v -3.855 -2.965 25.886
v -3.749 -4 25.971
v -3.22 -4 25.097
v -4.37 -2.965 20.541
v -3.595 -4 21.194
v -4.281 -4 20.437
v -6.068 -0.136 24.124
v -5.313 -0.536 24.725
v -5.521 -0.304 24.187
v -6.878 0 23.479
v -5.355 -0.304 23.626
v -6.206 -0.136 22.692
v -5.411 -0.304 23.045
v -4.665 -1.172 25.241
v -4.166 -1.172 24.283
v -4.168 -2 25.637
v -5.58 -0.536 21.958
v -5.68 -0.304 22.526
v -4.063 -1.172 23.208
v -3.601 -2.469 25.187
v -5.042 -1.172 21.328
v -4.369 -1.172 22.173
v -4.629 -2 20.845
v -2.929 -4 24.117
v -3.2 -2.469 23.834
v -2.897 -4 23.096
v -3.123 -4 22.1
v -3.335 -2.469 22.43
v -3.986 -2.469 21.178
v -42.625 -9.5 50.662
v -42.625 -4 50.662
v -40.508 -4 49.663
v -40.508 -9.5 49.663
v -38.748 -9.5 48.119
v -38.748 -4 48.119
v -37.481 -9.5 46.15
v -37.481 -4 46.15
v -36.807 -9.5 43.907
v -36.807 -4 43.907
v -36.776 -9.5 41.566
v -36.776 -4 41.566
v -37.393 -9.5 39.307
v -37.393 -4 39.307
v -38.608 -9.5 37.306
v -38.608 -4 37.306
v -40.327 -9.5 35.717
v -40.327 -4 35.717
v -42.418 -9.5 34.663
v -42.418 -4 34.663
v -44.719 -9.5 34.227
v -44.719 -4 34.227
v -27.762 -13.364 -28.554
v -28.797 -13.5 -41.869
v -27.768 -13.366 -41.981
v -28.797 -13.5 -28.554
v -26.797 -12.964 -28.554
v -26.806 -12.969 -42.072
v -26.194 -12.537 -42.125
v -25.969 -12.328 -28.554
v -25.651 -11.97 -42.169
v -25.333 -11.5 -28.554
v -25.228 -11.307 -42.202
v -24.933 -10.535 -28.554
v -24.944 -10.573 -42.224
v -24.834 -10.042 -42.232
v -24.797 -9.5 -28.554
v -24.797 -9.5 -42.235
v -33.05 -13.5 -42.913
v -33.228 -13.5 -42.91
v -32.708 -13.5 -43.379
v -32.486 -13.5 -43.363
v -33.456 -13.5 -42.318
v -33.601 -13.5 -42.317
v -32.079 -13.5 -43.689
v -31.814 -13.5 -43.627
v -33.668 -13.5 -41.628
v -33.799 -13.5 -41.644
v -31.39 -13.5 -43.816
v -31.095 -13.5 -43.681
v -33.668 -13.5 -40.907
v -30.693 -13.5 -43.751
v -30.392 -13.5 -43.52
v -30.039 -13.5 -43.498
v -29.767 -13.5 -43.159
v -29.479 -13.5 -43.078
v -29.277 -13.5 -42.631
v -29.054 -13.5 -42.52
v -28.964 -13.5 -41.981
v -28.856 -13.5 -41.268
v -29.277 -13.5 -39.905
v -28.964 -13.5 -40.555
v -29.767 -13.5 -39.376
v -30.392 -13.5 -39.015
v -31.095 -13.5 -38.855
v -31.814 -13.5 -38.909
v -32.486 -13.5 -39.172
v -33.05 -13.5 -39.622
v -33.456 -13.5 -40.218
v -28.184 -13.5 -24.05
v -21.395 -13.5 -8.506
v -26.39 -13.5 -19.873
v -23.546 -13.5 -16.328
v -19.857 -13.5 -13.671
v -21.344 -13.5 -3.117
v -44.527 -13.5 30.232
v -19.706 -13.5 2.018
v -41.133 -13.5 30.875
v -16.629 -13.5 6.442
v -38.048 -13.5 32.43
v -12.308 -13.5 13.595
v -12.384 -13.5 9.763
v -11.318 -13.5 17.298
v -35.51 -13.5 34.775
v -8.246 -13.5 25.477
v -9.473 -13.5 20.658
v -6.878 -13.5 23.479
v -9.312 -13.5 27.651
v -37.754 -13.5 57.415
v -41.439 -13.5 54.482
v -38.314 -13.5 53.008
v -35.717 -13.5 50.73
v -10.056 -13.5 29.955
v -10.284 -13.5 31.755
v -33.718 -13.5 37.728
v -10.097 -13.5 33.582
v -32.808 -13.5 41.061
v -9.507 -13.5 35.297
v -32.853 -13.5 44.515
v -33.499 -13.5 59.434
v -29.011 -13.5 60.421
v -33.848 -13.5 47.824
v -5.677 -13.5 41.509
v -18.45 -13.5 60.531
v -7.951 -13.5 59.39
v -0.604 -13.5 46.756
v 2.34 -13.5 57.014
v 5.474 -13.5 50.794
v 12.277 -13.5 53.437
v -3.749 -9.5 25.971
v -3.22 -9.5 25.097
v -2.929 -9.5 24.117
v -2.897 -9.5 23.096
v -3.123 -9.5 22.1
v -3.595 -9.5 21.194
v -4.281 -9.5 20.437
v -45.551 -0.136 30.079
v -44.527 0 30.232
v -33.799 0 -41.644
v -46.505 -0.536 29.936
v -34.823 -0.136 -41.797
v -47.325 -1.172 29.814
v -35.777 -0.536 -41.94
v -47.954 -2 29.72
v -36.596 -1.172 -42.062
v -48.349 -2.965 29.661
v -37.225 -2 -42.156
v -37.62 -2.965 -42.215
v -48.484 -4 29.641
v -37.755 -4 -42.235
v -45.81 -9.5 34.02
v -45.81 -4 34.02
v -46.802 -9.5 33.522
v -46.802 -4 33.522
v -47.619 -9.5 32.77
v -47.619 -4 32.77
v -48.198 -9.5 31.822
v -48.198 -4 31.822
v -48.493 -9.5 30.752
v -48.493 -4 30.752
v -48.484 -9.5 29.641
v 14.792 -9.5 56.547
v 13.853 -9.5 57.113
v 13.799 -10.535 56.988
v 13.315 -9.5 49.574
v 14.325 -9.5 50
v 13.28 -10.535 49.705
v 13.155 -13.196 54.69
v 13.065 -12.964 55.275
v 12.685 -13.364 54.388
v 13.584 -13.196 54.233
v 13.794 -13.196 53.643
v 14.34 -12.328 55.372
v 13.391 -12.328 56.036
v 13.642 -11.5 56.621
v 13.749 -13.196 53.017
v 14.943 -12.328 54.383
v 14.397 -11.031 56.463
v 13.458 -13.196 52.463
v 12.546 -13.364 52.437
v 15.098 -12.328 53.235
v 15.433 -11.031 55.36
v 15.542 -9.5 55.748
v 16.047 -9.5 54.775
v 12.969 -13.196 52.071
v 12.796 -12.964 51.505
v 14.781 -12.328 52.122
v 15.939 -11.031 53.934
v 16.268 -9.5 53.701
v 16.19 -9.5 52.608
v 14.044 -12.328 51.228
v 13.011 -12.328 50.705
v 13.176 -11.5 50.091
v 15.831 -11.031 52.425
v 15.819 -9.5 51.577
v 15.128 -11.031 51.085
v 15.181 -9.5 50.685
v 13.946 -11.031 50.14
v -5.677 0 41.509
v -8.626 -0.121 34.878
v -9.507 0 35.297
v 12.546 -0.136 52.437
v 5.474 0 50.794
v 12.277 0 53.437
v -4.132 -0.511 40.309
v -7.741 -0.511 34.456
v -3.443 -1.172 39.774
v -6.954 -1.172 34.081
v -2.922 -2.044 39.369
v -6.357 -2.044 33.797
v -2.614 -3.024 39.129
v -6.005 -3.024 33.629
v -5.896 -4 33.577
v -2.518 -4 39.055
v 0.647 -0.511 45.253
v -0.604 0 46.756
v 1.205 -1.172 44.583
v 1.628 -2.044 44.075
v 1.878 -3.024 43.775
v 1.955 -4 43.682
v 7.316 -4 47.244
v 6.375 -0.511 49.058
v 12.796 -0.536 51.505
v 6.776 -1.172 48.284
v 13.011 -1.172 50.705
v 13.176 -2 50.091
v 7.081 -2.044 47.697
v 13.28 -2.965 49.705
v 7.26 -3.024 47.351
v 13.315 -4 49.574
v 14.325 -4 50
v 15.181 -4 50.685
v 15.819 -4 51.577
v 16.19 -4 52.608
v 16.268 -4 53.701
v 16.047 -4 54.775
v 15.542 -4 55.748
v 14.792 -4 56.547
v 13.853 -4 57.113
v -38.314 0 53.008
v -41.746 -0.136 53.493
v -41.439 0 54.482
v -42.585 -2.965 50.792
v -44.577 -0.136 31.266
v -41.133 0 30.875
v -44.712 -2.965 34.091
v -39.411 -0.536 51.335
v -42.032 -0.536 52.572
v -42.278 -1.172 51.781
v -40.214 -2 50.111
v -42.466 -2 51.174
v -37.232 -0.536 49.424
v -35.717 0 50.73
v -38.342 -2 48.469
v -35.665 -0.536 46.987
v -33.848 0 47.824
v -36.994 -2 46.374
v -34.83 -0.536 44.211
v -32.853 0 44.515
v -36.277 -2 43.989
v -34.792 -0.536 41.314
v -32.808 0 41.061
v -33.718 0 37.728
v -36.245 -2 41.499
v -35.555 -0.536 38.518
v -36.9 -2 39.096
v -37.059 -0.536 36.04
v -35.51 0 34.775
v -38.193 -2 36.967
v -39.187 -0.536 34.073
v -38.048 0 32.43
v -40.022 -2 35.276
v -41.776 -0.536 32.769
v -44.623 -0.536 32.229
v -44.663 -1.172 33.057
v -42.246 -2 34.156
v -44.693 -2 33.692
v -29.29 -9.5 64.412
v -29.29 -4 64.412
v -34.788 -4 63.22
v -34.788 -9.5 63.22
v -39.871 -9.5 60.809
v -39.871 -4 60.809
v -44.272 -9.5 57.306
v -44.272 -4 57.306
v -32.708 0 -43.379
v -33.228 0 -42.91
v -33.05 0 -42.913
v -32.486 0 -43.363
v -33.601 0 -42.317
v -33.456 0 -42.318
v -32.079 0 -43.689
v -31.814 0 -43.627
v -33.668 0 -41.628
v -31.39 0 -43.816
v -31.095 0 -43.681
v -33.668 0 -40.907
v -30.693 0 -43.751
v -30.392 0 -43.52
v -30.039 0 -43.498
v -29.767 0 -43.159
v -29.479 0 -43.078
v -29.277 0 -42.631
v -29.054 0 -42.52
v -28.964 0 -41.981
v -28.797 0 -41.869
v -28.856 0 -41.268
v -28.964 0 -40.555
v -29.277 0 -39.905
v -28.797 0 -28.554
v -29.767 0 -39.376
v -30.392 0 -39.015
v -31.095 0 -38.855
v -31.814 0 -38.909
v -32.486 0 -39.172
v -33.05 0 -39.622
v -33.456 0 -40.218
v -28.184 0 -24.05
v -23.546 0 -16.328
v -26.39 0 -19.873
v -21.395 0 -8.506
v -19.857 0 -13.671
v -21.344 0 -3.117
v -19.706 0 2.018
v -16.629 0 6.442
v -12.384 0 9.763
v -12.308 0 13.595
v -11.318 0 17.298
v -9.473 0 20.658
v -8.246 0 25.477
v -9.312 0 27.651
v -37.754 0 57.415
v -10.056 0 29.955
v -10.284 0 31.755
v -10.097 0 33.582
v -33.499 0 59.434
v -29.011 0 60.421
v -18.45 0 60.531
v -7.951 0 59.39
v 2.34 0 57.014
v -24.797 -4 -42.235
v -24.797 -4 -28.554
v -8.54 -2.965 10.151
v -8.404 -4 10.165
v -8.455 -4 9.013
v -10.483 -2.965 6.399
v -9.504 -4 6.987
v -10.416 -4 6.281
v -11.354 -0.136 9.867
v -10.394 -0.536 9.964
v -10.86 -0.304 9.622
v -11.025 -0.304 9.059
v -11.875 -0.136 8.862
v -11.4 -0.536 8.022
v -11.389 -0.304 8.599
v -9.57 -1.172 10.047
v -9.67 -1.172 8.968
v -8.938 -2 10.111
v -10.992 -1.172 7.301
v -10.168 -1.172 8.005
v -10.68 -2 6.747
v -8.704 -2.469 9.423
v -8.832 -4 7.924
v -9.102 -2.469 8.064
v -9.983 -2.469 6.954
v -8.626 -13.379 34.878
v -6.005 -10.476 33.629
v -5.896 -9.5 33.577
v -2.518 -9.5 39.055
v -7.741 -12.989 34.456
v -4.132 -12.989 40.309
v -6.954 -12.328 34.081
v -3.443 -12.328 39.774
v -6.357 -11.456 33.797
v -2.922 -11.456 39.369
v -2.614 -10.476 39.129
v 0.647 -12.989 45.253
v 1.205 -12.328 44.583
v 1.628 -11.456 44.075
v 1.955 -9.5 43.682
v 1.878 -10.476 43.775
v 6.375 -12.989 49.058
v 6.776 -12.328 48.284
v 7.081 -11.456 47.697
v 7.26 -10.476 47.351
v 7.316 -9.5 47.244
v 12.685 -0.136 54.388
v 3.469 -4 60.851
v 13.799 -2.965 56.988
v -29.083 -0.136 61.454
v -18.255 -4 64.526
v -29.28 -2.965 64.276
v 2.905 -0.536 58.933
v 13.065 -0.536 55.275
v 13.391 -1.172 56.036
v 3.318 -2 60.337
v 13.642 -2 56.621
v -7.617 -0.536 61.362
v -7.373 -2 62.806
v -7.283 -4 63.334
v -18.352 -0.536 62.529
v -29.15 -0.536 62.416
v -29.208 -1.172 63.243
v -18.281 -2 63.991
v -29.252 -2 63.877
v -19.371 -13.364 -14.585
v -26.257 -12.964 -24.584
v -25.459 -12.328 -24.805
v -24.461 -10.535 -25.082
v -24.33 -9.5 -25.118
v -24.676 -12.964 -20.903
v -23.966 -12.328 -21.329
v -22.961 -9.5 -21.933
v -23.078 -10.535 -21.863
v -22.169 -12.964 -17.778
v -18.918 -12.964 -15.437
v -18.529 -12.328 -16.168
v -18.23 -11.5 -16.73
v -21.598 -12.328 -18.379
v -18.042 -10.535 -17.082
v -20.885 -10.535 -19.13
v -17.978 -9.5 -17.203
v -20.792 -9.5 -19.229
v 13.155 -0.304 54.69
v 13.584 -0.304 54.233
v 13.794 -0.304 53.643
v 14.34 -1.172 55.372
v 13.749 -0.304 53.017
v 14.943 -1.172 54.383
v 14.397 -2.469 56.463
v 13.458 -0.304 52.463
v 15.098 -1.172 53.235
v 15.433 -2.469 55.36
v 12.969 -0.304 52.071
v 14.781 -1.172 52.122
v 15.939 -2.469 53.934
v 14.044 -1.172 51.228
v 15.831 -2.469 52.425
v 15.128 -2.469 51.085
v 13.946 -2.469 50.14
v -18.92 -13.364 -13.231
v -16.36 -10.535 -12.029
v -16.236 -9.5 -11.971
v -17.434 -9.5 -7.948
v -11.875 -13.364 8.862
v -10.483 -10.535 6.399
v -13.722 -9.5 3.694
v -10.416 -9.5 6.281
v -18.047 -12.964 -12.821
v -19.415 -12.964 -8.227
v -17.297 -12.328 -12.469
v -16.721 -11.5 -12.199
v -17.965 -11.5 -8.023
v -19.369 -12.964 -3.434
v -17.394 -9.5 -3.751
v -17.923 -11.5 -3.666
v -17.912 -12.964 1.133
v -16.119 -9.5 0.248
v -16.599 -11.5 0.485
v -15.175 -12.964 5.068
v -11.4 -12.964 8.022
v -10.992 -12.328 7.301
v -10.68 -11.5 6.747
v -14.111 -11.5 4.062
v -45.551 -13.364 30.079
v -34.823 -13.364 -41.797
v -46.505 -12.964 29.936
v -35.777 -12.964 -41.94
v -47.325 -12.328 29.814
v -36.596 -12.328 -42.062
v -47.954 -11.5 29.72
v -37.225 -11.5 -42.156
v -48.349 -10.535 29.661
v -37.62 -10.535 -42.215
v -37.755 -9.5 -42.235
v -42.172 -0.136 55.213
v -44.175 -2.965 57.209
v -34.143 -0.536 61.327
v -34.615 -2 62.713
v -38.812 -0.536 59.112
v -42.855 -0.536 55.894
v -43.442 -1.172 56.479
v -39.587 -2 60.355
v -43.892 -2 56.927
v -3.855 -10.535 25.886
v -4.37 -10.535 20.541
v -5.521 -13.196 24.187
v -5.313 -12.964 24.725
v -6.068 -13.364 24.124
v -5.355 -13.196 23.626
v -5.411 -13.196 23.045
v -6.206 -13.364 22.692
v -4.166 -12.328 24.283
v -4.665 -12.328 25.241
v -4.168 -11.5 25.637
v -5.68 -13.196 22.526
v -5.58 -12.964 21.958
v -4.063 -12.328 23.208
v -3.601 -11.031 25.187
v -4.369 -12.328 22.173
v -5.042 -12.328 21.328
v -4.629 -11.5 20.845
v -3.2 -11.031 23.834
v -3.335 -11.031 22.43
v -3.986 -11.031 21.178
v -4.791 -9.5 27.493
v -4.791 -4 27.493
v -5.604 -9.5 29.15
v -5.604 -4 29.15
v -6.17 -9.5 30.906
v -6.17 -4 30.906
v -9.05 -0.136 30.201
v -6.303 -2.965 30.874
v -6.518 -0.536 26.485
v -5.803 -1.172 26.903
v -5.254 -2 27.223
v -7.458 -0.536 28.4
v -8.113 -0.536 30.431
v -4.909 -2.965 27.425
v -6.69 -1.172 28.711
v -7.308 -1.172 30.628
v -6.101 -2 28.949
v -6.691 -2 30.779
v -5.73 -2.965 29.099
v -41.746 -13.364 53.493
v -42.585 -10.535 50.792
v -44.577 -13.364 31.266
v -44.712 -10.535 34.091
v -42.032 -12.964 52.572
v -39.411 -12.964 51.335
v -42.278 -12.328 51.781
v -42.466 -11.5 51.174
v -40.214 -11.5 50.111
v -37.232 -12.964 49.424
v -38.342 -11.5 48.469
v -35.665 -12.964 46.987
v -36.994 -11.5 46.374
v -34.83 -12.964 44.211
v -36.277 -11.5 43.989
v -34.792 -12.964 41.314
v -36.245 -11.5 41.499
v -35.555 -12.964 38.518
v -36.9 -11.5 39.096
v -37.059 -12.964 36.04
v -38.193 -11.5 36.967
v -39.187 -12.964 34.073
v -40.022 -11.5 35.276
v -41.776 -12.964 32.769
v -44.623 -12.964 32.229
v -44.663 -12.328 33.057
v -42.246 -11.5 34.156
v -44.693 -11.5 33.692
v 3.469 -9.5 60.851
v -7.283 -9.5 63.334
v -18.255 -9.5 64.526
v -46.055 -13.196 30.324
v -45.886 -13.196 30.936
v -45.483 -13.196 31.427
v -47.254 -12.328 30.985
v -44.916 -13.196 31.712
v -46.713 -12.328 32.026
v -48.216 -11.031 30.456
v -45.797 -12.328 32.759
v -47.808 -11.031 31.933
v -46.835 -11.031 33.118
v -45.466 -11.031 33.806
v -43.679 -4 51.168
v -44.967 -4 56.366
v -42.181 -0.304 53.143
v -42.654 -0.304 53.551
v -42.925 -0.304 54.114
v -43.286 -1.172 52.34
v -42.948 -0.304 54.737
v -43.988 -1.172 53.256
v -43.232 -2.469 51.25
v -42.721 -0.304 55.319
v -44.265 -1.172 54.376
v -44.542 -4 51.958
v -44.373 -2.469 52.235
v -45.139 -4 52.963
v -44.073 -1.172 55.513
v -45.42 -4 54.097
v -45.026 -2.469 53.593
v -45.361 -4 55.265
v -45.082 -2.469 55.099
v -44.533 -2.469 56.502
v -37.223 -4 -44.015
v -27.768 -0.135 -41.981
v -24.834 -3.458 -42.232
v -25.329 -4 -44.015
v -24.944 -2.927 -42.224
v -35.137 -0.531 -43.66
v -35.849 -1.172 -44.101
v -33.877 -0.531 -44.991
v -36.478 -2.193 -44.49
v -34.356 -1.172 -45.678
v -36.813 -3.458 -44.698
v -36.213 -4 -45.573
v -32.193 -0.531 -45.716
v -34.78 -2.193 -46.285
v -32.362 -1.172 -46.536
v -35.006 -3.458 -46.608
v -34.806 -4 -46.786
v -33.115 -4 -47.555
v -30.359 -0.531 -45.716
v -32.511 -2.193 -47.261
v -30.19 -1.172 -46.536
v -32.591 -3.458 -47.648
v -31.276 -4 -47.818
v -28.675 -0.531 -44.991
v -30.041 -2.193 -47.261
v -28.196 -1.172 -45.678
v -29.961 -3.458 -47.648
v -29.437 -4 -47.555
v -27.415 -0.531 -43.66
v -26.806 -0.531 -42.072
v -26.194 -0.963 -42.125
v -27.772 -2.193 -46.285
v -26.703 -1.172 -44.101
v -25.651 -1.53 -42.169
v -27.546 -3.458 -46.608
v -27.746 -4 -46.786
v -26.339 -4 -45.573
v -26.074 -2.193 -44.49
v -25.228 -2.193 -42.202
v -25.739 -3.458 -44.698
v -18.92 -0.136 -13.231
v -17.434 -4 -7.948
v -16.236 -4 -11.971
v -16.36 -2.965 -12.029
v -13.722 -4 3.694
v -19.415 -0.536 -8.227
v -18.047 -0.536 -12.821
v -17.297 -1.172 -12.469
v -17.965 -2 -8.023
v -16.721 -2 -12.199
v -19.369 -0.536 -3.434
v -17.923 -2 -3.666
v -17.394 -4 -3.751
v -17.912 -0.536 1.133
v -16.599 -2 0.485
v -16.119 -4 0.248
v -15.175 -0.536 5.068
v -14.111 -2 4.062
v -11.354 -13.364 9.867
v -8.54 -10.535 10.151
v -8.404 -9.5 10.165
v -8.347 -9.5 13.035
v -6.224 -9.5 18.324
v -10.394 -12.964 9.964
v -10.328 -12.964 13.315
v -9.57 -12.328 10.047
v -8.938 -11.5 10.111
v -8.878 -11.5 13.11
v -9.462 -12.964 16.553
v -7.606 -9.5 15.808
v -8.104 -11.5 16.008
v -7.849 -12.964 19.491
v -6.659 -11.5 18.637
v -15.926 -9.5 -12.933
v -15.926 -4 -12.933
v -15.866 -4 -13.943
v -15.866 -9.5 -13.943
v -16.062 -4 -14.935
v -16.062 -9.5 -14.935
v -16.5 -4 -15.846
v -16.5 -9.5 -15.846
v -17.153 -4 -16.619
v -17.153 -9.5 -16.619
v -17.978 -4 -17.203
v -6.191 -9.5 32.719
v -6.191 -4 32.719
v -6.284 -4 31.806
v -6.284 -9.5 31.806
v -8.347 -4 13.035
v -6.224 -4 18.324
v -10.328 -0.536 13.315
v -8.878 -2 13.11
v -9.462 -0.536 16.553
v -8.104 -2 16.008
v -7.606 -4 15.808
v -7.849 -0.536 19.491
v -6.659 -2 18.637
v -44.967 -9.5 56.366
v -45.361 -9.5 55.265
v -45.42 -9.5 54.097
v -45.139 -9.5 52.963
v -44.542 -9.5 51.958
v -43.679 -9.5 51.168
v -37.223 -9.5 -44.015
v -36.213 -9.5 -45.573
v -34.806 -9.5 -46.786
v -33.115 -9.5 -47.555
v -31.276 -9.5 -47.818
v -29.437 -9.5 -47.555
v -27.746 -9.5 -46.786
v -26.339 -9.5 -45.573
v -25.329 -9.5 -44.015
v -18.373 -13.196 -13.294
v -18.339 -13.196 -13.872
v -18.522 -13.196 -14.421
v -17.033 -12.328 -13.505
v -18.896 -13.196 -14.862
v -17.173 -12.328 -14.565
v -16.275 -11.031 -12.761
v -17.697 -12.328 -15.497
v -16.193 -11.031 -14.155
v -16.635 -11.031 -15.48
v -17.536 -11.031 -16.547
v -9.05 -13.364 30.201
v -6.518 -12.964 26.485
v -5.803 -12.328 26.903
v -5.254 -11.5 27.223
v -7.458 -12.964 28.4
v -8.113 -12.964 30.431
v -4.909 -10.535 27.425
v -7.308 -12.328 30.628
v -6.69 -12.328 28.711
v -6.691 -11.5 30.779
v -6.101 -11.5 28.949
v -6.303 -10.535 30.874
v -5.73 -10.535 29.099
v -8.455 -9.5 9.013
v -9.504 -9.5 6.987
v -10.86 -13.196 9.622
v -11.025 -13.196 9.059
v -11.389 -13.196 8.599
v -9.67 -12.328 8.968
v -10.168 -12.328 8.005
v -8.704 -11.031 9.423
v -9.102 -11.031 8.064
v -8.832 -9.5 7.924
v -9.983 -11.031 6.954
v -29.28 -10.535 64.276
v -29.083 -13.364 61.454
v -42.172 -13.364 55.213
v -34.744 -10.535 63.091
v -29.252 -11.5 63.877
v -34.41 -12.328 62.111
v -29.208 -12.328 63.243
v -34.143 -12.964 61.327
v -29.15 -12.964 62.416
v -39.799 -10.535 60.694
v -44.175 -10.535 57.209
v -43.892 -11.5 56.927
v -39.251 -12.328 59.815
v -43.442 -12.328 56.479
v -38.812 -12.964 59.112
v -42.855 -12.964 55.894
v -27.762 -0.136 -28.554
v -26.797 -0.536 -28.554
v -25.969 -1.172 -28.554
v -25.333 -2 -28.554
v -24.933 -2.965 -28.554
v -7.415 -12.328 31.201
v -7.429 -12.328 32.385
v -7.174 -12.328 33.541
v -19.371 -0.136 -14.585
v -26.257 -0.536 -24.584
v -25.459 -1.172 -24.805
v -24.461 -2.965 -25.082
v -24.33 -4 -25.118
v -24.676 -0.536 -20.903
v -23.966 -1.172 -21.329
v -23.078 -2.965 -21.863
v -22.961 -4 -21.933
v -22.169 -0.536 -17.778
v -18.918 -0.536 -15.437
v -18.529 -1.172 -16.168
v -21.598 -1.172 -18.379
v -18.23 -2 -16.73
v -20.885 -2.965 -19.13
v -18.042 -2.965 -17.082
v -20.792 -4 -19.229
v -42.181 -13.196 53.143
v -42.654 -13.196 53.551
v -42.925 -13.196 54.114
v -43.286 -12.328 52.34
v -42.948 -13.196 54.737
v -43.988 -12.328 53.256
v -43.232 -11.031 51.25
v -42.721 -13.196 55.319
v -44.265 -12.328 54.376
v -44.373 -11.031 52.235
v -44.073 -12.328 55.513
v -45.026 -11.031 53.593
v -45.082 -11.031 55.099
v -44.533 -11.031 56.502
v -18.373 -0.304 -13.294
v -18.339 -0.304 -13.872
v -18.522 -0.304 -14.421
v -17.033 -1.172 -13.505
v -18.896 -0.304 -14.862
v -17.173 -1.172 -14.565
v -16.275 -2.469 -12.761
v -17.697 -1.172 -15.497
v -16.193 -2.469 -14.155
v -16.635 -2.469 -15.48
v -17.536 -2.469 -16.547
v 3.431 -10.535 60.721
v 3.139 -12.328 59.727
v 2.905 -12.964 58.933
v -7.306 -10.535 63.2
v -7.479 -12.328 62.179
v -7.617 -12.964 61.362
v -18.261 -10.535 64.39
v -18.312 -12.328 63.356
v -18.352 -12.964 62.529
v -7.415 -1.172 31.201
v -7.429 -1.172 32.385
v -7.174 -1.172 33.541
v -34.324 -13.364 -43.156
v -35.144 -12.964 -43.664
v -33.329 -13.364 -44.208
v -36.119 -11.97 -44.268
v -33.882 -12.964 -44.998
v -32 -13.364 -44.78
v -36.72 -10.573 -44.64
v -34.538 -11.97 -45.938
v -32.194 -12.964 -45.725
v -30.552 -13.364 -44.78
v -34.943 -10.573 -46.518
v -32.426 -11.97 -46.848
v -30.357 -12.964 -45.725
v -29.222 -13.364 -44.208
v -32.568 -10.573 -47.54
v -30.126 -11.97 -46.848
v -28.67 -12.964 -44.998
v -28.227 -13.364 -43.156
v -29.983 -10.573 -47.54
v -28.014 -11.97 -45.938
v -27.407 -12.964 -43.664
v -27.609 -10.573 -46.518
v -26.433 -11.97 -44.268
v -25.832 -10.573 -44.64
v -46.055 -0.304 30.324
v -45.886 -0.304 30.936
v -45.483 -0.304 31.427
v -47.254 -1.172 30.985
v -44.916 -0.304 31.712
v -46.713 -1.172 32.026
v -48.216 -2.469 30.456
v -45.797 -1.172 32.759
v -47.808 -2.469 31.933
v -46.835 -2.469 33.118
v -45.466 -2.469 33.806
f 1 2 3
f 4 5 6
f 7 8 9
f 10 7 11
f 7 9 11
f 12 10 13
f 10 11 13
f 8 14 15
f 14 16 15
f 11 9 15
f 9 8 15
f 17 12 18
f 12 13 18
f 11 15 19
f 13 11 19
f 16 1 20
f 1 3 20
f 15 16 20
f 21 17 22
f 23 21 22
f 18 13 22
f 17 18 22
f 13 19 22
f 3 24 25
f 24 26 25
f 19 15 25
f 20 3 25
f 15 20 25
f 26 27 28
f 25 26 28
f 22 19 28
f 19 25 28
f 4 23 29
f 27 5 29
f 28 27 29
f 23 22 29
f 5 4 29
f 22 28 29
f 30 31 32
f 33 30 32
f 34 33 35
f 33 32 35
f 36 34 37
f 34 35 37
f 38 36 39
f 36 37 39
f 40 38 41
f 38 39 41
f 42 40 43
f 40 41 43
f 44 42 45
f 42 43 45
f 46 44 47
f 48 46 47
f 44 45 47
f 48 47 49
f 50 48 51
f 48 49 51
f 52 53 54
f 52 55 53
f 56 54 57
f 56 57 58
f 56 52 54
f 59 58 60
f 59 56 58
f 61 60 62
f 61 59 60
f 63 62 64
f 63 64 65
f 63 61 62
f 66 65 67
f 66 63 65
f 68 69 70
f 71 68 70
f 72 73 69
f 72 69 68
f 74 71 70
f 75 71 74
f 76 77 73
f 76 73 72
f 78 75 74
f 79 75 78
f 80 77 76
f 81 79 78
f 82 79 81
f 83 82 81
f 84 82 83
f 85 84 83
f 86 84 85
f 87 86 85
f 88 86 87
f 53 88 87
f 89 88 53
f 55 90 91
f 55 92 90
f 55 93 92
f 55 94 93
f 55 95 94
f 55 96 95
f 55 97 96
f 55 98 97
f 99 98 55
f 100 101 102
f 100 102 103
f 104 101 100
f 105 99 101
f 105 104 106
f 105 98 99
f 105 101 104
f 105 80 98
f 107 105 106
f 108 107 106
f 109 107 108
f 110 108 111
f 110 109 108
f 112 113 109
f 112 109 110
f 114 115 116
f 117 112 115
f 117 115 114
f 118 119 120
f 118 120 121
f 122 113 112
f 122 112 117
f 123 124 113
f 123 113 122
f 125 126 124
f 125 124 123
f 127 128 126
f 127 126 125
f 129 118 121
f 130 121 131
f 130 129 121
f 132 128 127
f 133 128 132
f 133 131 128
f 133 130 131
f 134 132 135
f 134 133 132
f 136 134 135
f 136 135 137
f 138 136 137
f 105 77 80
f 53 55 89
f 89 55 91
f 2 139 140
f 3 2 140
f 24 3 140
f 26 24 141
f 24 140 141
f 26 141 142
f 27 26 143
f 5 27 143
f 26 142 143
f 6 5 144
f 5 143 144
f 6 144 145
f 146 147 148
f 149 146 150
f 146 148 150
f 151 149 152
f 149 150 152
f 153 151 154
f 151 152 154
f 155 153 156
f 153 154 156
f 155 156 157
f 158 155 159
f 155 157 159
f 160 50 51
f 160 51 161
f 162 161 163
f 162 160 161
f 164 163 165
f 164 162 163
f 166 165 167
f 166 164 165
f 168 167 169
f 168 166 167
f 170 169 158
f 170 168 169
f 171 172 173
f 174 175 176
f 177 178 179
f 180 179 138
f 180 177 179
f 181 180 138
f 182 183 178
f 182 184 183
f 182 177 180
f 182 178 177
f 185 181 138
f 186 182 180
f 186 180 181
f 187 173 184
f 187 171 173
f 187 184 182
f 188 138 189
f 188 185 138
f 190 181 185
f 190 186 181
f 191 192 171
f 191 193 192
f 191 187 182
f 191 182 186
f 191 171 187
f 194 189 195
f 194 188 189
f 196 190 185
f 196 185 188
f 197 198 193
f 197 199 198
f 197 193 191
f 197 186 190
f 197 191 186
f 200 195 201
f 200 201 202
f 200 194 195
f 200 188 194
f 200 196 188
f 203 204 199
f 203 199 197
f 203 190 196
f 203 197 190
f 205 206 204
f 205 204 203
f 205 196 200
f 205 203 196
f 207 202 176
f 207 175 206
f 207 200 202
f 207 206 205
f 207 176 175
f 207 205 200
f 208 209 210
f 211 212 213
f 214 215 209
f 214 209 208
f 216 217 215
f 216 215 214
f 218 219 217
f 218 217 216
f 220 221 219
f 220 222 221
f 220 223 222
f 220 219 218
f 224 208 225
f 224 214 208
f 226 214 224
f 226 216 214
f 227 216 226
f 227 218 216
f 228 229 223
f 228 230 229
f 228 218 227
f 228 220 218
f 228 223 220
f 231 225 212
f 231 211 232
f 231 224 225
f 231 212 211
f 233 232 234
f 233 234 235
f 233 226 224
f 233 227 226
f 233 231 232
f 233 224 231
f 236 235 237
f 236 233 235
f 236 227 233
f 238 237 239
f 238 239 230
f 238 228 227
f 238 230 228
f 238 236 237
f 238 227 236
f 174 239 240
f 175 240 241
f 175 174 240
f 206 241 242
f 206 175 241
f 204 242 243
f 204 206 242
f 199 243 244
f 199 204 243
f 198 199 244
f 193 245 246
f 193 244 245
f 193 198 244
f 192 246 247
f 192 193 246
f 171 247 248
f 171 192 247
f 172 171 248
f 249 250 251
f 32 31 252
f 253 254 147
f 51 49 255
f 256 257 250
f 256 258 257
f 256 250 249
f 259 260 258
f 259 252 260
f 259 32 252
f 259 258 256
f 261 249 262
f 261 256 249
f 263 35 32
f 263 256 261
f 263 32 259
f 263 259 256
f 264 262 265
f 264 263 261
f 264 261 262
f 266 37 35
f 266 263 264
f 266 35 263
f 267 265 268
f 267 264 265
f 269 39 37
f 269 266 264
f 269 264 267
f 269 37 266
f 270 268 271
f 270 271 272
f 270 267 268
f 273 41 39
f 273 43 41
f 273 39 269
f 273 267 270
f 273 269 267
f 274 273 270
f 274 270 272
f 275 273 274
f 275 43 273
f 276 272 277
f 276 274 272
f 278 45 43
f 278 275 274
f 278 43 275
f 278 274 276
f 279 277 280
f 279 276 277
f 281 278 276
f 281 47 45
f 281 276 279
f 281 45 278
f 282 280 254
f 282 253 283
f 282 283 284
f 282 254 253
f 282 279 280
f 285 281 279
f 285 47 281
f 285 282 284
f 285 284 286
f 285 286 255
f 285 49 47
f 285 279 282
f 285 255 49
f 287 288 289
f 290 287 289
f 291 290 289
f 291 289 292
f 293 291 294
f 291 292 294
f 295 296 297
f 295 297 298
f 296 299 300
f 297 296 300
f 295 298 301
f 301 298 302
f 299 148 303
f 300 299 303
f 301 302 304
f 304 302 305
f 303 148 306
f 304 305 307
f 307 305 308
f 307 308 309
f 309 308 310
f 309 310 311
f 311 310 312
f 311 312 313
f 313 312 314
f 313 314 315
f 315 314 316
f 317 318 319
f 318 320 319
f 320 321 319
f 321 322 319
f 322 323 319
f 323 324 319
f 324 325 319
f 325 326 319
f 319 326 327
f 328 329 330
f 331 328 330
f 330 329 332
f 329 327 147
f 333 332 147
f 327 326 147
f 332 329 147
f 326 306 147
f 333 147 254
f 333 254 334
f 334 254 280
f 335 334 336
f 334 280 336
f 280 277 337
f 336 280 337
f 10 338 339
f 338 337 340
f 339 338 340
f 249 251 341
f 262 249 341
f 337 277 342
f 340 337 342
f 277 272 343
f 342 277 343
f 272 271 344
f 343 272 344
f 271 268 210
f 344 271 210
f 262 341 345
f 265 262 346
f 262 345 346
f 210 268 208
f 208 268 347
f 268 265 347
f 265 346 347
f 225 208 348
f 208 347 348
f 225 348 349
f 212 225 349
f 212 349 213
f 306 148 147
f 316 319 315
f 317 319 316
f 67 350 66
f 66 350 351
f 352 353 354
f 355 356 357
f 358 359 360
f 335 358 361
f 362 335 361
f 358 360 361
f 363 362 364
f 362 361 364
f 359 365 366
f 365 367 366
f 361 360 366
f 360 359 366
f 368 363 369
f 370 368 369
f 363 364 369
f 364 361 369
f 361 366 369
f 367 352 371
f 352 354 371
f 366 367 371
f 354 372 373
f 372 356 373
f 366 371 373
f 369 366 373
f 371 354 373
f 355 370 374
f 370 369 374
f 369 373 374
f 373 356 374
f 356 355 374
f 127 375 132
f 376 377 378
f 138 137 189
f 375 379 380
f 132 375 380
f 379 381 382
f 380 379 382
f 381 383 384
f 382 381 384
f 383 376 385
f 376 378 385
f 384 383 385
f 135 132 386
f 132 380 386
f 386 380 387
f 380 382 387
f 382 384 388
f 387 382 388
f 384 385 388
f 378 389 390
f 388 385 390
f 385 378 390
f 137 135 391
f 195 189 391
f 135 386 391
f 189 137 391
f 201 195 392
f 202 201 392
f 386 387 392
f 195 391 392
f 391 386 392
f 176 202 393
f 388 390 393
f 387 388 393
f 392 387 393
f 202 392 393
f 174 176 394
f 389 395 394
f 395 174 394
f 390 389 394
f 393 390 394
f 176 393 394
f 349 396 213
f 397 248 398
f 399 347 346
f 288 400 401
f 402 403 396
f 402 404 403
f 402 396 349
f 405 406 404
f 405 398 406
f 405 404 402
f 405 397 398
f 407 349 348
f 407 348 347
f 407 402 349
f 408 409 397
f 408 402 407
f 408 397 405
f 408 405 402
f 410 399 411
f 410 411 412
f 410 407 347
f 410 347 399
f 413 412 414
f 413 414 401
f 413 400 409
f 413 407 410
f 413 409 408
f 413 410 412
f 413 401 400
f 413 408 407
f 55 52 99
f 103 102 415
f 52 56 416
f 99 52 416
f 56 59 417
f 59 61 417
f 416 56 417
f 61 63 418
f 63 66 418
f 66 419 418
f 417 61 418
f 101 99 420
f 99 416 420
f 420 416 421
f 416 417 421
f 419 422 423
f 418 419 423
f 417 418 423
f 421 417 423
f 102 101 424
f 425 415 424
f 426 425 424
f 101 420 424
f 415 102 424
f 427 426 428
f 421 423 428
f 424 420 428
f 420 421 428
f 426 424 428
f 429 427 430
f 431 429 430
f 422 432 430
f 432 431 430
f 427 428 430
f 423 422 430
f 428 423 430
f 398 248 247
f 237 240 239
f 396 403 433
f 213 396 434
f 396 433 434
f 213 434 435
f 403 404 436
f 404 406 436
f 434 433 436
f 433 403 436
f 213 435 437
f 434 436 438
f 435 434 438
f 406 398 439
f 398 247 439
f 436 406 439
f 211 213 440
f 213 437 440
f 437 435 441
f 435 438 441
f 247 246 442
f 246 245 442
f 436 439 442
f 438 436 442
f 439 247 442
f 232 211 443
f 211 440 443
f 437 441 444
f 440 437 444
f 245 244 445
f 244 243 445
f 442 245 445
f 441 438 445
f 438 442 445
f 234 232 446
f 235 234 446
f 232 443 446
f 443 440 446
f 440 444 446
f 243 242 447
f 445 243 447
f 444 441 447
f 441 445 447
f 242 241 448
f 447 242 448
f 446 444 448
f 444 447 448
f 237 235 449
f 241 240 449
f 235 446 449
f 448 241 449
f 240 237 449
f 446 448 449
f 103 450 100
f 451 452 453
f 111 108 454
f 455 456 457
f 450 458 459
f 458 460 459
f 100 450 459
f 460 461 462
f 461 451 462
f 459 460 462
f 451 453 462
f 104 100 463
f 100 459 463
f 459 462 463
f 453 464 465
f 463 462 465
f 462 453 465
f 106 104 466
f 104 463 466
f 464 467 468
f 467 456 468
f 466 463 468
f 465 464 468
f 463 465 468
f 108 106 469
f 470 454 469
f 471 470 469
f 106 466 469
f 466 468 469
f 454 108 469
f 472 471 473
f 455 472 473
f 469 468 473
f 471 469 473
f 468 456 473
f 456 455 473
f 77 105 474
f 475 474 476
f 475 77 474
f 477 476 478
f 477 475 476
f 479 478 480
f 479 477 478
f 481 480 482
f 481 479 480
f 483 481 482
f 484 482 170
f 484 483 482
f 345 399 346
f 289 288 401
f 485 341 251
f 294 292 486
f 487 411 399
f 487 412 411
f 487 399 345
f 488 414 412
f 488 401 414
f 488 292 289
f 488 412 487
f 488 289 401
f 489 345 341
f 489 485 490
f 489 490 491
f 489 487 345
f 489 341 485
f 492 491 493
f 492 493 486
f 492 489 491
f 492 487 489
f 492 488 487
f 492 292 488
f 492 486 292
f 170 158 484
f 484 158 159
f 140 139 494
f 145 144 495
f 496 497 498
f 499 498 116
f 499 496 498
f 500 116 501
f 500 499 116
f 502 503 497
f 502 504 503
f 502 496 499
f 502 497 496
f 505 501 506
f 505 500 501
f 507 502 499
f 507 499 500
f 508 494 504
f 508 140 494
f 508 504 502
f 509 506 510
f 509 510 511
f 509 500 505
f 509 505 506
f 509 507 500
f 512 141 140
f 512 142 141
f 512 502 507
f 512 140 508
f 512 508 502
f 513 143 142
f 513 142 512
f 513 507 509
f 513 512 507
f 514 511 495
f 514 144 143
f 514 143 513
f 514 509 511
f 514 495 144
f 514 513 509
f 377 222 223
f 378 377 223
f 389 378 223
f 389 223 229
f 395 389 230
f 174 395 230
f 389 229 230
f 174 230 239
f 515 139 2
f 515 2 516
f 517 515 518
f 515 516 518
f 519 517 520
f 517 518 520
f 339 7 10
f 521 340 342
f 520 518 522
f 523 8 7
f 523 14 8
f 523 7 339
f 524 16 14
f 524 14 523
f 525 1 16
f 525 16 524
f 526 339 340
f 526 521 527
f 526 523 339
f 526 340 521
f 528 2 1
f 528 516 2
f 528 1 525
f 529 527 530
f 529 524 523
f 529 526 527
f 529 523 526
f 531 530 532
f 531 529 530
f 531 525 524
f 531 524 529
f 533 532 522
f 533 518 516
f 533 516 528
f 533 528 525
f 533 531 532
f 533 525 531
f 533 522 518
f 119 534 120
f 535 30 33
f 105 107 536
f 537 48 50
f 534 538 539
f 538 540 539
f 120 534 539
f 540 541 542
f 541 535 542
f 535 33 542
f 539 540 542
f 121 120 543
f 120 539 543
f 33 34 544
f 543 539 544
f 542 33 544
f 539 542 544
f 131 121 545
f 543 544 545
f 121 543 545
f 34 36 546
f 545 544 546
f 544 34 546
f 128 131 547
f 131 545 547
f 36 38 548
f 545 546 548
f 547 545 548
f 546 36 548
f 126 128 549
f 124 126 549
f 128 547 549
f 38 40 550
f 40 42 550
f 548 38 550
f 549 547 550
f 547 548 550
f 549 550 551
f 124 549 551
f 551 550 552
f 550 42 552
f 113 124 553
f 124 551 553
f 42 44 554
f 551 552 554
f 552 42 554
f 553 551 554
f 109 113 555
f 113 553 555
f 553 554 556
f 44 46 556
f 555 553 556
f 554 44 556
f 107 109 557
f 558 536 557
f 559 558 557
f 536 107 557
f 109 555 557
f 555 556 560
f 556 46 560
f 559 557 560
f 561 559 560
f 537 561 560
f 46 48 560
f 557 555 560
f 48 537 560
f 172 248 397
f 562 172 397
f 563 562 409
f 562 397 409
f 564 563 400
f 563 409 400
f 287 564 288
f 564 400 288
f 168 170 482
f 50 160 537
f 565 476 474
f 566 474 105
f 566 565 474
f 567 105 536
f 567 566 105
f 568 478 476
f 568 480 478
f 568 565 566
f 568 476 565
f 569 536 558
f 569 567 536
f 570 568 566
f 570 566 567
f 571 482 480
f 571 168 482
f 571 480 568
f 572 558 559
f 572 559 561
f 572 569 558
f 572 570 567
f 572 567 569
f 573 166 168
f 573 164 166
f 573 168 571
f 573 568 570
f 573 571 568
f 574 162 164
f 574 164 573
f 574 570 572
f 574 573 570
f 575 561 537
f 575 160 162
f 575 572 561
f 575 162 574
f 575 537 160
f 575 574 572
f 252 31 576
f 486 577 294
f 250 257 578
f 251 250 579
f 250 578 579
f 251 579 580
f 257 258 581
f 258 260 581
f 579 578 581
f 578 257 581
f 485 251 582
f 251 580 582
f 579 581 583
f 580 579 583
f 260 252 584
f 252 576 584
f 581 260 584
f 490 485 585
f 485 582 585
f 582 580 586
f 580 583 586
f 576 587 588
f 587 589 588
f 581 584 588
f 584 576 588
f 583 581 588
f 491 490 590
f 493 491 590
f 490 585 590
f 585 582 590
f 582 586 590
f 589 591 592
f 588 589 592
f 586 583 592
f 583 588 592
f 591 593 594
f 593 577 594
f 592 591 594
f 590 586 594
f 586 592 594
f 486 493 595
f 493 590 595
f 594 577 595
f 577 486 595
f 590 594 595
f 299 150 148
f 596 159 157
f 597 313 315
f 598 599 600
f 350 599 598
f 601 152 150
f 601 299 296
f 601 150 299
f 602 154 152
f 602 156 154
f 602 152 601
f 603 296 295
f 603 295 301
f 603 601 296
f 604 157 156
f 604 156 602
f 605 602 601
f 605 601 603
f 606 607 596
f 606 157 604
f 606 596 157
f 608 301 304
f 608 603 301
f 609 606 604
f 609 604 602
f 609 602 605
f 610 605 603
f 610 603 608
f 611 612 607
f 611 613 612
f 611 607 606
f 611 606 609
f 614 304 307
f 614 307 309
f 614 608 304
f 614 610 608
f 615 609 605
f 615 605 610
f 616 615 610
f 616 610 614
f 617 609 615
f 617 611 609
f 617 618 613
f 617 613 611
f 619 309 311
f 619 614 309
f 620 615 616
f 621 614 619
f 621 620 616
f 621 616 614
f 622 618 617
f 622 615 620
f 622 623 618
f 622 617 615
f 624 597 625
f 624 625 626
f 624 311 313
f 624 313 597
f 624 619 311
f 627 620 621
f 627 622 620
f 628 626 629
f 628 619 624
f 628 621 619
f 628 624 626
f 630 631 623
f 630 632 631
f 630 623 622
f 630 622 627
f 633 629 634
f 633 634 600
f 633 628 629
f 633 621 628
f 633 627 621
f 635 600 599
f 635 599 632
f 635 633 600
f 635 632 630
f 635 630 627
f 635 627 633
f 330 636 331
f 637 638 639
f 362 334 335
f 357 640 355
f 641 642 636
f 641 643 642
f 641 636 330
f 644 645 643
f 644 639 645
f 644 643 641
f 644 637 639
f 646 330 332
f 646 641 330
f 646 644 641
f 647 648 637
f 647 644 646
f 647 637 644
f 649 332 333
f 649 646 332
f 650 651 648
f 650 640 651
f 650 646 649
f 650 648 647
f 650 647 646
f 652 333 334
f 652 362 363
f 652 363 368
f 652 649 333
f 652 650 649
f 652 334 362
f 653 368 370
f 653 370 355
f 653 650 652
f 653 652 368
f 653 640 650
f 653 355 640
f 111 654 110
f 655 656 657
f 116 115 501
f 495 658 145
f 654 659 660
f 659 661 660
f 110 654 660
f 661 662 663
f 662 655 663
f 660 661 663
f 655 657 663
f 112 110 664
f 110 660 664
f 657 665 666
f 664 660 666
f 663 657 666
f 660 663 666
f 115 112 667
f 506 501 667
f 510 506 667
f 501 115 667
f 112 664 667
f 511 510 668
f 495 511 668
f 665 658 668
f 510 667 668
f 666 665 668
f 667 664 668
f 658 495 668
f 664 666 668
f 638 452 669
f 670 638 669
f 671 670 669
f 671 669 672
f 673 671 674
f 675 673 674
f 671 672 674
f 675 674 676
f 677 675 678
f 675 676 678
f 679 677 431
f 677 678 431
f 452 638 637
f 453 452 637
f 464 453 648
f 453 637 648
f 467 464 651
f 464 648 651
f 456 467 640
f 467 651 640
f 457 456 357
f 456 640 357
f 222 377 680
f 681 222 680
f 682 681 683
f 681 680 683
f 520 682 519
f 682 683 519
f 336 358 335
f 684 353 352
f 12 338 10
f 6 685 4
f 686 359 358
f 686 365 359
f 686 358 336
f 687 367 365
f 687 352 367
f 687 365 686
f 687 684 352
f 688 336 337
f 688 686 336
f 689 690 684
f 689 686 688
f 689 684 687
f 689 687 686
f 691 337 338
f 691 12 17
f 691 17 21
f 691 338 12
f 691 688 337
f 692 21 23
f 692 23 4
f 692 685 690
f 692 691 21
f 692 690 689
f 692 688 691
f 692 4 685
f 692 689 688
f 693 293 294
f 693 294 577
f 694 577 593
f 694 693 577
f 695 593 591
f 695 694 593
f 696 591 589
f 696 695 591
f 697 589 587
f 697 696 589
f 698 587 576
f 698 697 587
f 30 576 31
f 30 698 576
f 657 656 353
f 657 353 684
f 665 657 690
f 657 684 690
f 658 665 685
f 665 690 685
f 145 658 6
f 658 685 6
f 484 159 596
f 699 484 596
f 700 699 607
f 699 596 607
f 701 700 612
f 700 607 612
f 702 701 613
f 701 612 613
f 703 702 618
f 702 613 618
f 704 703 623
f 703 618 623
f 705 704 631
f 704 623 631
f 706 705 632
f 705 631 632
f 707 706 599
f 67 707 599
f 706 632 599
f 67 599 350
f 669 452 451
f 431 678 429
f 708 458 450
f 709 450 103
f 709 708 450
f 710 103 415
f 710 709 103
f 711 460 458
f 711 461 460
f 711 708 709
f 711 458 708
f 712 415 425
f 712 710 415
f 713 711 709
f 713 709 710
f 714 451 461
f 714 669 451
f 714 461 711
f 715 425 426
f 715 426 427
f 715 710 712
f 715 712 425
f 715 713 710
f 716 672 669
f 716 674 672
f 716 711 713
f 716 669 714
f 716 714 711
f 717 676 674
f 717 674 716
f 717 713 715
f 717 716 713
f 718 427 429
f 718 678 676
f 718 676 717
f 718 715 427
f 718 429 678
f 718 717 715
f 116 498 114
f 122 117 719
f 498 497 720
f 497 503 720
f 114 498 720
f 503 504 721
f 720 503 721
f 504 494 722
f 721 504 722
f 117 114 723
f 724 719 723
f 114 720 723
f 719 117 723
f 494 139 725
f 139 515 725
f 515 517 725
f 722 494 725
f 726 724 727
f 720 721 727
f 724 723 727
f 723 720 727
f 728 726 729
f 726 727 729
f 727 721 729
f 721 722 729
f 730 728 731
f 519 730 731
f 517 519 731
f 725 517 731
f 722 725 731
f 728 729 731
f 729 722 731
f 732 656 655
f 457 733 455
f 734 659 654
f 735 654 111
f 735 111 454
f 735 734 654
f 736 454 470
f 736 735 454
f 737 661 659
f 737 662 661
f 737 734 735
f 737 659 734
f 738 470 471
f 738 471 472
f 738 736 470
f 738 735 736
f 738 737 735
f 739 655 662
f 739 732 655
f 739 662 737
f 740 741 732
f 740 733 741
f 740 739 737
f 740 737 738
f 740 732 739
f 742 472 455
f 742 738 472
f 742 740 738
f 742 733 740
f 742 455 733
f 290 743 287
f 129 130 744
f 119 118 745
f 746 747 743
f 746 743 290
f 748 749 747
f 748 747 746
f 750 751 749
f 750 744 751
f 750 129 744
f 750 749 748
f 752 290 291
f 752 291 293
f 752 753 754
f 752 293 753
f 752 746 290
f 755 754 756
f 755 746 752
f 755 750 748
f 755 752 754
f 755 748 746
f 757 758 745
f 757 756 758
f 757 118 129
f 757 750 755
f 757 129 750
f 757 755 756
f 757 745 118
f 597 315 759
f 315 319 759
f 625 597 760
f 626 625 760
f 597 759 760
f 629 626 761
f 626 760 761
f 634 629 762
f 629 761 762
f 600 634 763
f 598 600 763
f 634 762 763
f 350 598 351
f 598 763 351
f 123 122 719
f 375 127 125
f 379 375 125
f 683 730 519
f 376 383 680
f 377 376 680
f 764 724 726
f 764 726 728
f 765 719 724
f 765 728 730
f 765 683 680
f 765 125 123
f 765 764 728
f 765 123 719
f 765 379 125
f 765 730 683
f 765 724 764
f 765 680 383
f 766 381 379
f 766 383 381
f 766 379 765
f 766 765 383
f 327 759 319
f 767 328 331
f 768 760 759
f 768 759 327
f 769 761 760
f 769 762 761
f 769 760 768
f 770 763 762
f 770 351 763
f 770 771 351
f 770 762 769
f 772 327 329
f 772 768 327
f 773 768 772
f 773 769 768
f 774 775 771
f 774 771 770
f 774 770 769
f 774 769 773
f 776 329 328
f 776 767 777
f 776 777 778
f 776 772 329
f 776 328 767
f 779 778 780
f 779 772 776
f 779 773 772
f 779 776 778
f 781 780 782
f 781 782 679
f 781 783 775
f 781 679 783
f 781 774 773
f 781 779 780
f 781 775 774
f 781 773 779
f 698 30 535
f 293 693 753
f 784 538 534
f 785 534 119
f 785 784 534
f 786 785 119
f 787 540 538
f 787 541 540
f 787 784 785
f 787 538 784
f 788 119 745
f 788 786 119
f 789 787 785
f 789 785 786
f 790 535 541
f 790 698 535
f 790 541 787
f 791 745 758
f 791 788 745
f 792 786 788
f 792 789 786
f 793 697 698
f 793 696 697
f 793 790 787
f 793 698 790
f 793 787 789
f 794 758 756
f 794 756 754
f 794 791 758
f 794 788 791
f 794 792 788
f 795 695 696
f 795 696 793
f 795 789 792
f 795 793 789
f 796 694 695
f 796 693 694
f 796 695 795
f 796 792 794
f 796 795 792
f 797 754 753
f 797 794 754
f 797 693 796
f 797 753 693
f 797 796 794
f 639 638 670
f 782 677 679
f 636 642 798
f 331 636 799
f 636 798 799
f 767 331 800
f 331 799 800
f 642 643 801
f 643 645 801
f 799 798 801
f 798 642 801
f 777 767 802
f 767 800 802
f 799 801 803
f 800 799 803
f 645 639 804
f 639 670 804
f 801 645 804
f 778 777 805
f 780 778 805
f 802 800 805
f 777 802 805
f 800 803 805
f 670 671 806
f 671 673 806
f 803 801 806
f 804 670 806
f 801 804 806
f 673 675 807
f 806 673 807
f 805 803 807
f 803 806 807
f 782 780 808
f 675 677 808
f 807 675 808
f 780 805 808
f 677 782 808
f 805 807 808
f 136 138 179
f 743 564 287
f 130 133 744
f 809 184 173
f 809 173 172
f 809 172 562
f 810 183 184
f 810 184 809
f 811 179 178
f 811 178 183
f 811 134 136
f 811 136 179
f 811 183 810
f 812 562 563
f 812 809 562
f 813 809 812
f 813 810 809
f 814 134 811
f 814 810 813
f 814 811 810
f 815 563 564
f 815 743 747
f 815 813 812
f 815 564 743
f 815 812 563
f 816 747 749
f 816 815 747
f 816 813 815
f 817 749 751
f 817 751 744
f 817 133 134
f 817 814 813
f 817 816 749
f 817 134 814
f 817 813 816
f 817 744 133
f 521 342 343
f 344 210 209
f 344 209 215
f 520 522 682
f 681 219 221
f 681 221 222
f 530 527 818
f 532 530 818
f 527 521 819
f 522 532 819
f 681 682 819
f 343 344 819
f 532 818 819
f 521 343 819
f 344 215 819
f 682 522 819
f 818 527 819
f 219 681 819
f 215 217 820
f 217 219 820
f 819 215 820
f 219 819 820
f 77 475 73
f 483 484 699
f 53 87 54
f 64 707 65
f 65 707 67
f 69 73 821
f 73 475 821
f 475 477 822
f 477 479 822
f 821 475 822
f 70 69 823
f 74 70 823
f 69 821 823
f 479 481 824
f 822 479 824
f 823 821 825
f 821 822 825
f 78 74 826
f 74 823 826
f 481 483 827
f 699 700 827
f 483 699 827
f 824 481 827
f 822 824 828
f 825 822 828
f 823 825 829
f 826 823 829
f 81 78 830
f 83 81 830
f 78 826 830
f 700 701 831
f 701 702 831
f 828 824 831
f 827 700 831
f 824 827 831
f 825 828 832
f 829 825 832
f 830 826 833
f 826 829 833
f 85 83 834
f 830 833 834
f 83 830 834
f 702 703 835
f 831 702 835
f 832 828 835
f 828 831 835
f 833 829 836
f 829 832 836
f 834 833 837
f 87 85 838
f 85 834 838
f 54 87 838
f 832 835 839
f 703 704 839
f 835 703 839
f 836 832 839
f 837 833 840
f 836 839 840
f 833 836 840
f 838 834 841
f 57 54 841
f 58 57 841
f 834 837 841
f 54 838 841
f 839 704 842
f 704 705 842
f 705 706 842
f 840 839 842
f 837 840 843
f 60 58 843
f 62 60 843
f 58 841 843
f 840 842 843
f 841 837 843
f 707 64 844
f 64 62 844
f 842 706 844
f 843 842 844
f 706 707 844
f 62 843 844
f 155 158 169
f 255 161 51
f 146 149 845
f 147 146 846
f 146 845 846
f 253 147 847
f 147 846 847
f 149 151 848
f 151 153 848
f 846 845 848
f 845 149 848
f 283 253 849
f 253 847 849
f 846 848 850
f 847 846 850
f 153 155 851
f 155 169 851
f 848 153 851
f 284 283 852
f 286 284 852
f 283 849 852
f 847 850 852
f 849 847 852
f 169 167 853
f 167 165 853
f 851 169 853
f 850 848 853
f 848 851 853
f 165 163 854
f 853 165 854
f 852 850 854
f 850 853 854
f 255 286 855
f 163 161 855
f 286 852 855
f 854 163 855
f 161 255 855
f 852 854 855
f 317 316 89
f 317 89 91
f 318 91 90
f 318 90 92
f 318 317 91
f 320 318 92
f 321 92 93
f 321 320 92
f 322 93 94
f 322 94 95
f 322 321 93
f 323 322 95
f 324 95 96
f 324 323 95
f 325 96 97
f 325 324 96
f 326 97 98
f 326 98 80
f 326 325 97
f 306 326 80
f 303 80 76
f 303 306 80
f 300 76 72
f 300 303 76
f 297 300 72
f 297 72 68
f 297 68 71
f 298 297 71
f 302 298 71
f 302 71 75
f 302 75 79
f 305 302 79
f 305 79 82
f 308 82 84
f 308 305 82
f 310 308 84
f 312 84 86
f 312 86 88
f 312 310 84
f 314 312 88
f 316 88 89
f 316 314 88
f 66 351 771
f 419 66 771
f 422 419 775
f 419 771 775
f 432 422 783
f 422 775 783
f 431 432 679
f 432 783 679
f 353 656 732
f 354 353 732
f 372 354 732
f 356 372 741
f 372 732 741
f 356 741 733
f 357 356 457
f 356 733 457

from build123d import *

# Parameters (mm, degrees)
F0_R     = 2.4195470085
F1_DEPTH = 13.5
F2_F1_R  = 4
F2_F2_R  = 4


with BuildPart() as f1:
    # F0 (on Front) → F1 (new body)
    with BuildSketch(Plane.XZ):
        with BuildLine():
            Line((-49.3356961767, 35.3497361023), (-37.7547828112, -42.2348335668))
            ThreePointArc((-37.7547828112, -42.2348335668), (-31.2758758664, -47.8184260428), (-24.7969689216, -42.2348335668))
            Line((-24.7969689216, -42.2348335668), (-24.7969689216, -28.5535179778))
            ThreePointArc((-24.7969689216, -28.5535179778), (-21.5958448136, -20.0642473306), (-13.5864750371, -15.8022164227))
            ThreePointArc((-13.5864750371, -15.8022164227), (-17.1539367925, -2.5764868036), (-7.7963641737, 7.4276394461))
            ThreePointArc((-7.7963641737, 7.4276394461), (-7.171857042, 16.766091593), (0, 22.7795069476))
            ThreePointArc((0, 22.7795069476), (-4.3611353912, 26.8073603633), (-6.4391756912, 32.3683722811))
            ThreePointArc((-6.4391756912, 32.3683722811), (7.334028543, 47.2529836996), (27.4388096167, 49.9082783979))
            ThreePointArc((27.4388096167, 49.9082783979), (0.2448615743, 61.737698638), (-29.2898025364, 64.4115739572))
            ThreePointArc((-29.2898025364, 64.4115739572), (-41.2715843547, 59.8673520775), (-49.3356961767, 49.9082783979))
            ThreePointArc((-49.3356961767, 49.9082783979), (-36.7089619026, 42.6290072501), (-49.3356961767, 35.3497361023))
        make_face()
        with Locations((-31.2758758664, -41.2677384298)):
            Circle(F0_R, mode=Mode.SUBTRACT)
    extrude(amount=F1_DEPTH)

    # F2: fillet of radius 4 on 26 edges, made by hand

    # F2_f1
    f2_f1_edges = [f1.edges().sort_by_distance(p)[0] for p in [
        (-6.4391756912, -6.75, 32.3683722811),
    ]]
    fillet(f2_f1_edges, radius=F2_F1_R)

    # F2_f2
    f2_f2_edges = [f1.edges().sort_by_distance(p)[0] for p in [
        (0, -6.75, 22.7795069476),
        (-3.9287601455, 0, 26.2022043612),
        (-3.9287601455, -13.5, 26.2022043612),
        (-7.7963641737, -6.75, 7.4276394461),
        (-7.171857042, 0, 16.766091593),
        (-7.171857042, -13.5, 16.766091593),
        (-13.5864750371, -6.75, -15.8022164227),
        (-17.1539367925, 0, -2.5764868036),
        (-17.1539367925, -13.5, -2.5764868036),
        (-21.5958448136, 0, -20.0642473306),
        (-21.5958448136, -13.5, -20.0642473306),
        (-49.3356961767, -6.75, 35.3497361023),
        (-43.545239494, 0, -3.4425487322),
        (-43.545239494, -13.5, -3.4425487322),
        (27.4388096167, -6.75, 49.9082783979),
        (-29.2898025364, -6.75, 64.4115739572),
        (0.2448615743, 0, 61.737698638),
        (0.2448615743, -13.5, 61.737698638),
        (-49.3356961767, -6.75, 49.9082783979),
        (-41.2715843547, 0, 59.8673520775),
        (-41.2715843547, -13.5, 59.8673520775),
        (-36.7089619026, 0, 42.6290072501),
        (-36.7089619026, -13.5, 42.6290072501),
        (-31.2758758664, -13.5, -47.8184260428),
        (-31.2758758664, 0, -47.8184260428),
        (-24.7969689216, -13.5, -35.3941757723),
        (-24.7969689216, 0, -35.3941757723),
        (-6.2638737515, -13.5, 32.2652253516),
        (-6.2638737515, 0, 32.2652253516),
    ]]
    fillet(f2_f2_edges, radius=F2_F2_R)


solid = f1.part
